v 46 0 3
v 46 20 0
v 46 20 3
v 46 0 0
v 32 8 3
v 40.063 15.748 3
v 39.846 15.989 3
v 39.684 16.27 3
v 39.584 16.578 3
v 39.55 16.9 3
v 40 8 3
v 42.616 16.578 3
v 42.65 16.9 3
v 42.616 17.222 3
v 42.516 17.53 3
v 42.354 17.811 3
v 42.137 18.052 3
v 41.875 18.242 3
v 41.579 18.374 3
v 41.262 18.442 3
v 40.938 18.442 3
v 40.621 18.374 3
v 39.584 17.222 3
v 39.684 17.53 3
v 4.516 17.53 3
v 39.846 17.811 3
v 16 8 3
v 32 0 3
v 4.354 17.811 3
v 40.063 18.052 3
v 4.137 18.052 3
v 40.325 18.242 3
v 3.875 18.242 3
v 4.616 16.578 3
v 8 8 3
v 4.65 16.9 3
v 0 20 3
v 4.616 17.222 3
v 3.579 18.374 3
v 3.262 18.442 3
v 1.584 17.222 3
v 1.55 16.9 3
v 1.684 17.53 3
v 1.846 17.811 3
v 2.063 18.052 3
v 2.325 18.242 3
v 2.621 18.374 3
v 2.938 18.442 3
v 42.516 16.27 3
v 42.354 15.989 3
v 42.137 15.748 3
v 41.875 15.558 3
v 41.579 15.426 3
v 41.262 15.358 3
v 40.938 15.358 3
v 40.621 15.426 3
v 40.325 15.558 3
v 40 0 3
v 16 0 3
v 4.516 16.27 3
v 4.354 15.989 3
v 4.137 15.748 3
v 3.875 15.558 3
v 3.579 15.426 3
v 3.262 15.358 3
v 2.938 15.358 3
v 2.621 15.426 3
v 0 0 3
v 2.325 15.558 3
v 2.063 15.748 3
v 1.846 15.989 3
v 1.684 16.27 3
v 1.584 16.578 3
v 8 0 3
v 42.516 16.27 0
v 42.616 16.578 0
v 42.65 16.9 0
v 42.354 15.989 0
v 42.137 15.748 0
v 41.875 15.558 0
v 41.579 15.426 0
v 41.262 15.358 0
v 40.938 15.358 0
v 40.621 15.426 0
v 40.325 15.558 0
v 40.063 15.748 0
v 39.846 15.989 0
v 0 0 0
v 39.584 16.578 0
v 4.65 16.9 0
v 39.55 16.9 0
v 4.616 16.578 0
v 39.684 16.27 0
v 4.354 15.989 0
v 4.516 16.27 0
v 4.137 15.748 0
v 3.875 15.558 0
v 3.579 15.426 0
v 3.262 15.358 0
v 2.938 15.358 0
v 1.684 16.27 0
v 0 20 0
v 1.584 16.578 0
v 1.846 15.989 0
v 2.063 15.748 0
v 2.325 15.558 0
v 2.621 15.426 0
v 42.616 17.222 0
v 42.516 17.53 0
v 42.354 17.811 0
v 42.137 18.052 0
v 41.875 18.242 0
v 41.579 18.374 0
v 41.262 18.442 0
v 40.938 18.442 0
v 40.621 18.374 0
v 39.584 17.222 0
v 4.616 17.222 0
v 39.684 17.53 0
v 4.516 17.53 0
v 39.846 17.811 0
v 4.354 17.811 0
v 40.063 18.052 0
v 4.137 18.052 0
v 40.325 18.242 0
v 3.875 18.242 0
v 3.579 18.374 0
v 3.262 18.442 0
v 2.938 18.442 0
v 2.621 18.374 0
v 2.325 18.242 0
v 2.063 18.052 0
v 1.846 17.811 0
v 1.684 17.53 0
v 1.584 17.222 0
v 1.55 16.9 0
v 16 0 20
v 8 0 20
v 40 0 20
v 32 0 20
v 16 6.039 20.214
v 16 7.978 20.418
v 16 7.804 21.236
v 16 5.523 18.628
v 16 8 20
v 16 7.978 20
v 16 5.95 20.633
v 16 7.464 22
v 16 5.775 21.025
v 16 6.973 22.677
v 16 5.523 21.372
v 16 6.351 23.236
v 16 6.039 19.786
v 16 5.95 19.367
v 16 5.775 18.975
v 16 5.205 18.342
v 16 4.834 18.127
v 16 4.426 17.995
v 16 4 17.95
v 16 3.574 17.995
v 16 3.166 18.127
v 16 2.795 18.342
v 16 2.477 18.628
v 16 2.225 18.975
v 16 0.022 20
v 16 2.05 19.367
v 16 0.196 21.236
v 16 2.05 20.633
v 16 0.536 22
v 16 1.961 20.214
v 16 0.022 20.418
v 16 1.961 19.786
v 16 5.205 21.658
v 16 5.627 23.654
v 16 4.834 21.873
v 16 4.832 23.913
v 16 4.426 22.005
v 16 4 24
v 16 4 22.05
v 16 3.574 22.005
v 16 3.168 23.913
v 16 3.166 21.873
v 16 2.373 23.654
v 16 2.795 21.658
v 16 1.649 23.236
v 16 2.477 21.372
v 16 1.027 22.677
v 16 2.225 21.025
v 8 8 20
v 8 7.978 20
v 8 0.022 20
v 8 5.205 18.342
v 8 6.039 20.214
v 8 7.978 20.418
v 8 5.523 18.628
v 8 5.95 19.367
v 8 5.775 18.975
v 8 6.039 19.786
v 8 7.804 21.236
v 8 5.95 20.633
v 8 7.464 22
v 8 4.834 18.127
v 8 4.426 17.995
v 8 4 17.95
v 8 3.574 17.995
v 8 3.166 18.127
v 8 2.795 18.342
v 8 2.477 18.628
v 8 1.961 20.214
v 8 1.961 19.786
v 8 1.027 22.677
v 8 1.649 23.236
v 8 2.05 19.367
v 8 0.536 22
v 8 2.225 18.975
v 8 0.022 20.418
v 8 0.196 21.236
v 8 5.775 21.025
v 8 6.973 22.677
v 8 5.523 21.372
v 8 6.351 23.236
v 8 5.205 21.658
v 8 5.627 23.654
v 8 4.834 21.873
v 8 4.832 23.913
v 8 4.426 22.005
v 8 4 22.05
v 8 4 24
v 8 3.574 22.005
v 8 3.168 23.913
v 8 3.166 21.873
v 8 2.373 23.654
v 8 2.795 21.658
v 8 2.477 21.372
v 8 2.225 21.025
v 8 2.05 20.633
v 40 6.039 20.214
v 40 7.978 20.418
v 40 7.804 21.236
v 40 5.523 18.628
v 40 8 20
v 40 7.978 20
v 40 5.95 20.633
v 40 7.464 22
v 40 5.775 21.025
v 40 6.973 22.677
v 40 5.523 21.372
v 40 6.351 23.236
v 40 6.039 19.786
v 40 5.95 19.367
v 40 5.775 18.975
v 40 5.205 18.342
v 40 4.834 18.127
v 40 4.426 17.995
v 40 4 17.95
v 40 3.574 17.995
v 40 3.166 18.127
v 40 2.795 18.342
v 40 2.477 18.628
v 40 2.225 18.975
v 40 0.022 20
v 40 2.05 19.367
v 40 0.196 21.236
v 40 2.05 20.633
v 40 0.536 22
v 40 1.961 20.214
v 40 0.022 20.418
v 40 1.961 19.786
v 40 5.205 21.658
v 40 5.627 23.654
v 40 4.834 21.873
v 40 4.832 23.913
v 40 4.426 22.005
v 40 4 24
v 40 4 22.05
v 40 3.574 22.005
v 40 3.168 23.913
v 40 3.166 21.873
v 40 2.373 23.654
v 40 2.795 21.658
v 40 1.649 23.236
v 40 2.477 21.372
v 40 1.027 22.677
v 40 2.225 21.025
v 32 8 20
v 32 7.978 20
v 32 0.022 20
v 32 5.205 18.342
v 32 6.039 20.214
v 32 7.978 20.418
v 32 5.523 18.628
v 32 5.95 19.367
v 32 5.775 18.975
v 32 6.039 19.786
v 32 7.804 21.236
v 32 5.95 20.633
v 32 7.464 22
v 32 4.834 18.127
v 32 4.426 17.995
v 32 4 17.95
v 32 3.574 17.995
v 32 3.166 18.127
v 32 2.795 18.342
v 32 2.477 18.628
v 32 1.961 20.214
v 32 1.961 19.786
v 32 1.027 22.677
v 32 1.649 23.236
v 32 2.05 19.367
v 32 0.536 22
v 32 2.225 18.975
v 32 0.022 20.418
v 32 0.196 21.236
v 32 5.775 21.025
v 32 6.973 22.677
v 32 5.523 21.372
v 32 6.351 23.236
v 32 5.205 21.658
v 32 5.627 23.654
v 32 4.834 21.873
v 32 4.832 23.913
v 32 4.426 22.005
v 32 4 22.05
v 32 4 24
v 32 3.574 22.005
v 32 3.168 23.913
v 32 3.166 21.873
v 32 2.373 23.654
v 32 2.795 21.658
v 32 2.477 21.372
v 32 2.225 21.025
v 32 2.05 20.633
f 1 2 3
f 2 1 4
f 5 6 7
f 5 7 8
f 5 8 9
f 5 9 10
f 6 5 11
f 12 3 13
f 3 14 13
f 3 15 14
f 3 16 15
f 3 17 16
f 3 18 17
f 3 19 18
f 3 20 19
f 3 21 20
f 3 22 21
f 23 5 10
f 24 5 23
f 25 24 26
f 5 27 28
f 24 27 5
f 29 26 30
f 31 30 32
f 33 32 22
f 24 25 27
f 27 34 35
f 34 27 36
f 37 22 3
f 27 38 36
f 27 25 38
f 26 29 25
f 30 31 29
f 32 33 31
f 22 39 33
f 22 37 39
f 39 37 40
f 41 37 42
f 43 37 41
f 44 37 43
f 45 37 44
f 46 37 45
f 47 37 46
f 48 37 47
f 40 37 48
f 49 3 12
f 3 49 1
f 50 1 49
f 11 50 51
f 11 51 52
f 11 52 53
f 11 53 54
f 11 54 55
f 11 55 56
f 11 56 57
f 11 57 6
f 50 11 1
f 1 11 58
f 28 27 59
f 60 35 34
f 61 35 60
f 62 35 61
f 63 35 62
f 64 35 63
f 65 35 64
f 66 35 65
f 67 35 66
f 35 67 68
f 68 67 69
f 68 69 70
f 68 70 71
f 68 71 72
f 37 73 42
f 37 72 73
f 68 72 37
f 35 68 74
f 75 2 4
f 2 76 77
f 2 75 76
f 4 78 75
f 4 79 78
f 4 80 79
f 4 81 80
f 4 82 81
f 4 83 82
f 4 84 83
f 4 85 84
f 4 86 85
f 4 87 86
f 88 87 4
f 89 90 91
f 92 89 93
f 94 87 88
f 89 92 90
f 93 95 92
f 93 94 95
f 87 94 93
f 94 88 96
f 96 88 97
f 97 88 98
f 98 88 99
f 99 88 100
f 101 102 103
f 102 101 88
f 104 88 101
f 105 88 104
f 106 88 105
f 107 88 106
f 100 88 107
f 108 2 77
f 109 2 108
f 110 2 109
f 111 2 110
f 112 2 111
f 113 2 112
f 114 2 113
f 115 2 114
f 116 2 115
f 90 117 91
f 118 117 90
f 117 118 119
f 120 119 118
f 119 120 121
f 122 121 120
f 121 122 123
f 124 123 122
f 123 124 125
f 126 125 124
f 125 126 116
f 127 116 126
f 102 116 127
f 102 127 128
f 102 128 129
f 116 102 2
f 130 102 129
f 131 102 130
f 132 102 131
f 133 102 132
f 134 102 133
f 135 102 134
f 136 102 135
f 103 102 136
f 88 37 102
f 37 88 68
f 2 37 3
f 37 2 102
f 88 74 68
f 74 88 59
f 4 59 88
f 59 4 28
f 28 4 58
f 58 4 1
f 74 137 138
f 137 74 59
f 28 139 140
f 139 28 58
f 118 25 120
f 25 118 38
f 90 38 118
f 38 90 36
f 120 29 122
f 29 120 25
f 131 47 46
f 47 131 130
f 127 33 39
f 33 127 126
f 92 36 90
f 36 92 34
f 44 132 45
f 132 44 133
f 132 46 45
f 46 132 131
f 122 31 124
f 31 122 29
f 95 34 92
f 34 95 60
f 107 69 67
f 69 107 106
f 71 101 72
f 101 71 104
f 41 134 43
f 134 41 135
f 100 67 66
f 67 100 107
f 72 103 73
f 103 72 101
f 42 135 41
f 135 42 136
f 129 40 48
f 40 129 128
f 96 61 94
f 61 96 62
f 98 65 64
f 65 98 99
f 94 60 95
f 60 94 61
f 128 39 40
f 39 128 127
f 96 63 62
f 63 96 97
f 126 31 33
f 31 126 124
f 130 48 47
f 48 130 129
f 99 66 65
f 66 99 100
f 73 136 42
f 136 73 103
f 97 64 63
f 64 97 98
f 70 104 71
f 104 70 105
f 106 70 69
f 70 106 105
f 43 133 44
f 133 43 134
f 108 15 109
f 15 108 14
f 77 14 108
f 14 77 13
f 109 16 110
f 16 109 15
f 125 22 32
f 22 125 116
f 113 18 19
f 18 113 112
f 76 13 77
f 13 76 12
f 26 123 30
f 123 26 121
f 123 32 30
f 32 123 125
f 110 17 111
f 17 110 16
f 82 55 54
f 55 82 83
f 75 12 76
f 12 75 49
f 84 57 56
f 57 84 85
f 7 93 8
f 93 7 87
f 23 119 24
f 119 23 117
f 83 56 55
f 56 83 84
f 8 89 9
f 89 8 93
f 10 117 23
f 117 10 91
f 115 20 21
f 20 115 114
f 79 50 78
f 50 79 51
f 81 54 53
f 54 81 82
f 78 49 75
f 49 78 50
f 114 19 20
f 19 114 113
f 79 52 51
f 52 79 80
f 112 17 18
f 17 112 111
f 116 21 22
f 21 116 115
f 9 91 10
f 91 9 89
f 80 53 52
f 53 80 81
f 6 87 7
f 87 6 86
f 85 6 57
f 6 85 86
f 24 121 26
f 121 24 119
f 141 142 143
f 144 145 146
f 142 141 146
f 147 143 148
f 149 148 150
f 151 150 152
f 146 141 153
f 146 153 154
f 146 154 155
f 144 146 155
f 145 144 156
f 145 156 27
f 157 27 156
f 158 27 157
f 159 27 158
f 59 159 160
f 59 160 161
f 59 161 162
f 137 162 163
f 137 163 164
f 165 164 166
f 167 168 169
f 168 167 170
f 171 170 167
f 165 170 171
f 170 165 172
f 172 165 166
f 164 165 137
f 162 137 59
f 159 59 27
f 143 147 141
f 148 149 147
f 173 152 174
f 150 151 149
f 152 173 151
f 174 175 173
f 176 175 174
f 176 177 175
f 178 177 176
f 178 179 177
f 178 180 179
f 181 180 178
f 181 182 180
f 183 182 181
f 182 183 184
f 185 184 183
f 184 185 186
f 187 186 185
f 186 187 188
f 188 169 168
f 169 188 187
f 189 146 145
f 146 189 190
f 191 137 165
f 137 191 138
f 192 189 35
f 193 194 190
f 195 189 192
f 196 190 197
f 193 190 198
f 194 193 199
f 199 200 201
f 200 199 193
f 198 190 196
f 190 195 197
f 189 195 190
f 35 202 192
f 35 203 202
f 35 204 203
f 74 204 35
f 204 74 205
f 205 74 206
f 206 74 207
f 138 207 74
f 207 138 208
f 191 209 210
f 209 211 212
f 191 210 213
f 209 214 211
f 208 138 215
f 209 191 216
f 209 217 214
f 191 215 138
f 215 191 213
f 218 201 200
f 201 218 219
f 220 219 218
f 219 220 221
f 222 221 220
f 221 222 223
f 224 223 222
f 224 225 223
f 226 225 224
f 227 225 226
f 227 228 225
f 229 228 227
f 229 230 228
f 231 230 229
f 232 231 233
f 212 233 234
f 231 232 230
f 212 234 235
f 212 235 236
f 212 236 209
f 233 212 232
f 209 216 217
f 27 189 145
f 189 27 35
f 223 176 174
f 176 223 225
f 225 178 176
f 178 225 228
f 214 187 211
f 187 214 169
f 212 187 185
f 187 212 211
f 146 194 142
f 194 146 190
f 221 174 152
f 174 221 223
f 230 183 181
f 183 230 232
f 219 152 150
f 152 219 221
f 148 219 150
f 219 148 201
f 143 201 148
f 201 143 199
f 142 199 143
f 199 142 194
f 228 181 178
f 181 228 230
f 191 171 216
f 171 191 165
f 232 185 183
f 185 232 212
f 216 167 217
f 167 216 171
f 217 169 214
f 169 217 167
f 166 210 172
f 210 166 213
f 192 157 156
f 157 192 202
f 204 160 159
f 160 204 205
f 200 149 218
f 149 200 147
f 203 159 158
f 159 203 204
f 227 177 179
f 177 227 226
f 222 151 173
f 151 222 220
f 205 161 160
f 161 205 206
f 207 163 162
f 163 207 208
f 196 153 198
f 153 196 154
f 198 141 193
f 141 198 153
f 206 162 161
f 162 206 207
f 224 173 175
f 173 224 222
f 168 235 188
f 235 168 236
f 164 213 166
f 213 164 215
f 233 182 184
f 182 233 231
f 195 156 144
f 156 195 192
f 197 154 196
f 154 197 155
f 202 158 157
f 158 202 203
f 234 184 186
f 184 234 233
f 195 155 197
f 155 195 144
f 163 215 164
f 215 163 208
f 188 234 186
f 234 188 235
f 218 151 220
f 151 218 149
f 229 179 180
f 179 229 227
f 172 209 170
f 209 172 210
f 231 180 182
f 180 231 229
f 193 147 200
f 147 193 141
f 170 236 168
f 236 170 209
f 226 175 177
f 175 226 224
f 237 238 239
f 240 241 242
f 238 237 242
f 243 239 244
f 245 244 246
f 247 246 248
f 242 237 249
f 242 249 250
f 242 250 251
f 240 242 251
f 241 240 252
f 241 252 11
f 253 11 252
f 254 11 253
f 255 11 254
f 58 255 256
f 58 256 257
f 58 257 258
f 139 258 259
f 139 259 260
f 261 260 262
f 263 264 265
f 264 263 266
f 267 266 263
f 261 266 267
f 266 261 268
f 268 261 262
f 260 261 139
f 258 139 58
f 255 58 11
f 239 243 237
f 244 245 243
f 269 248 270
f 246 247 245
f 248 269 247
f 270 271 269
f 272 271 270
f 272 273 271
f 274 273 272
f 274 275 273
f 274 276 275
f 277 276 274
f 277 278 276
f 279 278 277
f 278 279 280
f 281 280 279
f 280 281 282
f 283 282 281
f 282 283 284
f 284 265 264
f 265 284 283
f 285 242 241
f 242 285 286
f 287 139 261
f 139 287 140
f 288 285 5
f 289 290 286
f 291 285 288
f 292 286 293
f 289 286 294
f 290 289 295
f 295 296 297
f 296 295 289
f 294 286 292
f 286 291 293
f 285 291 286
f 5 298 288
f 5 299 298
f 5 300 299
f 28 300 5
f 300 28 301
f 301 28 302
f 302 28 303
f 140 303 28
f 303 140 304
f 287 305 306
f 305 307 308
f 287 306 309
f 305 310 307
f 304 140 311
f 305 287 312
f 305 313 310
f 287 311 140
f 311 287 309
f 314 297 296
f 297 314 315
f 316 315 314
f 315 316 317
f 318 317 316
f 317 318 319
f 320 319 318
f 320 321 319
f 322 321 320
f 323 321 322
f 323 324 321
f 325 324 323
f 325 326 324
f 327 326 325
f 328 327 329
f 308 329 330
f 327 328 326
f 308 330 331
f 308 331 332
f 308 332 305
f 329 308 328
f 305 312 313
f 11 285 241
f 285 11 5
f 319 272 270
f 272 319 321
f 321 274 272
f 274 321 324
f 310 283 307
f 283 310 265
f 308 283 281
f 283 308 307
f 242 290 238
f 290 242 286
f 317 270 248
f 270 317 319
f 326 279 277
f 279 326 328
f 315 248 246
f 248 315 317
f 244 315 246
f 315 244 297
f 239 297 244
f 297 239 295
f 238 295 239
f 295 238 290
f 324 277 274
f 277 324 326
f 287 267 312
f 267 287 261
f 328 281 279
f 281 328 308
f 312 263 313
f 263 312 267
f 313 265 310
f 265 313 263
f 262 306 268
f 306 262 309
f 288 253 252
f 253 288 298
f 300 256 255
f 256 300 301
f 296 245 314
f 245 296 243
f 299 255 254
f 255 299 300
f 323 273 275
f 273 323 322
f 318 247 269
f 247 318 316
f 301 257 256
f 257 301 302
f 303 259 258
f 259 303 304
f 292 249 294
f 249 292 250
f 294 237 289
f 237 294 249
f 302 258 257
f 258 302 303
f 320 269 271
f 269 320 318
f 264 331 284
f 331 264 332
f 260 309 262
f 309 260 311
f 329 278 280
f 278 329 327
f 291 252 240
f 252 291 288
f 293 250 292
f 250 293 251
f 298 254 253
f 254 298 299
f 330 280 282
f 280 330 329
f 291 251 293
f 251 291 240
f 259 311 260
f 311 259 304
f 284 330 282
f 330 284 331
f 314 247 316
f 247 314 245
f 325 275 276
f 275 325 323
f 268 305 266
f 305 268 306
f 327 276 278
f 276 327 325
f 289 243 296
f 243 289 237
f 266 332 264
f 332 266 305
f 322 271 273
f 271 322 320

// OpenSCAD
// Cooling Fan Bracket
$fs = 0.2;		// Circle edges 


bearing_id = 8.0;
bearing_od = 22.0;
bearing_w = 7.0;

fan_length = 46;
fan_width = 20;

wall_thickness = 3;
pillar_width=8.0;
pillar_height=20.0;

fan_dist = 38.0 ;
bracket_dist = 16.0;


widget_offset = 10; // amount of x-travel to side of y-tray
bearing_offset = -0.5; // amount of bearing height from tray

m4_bolt = 2.05;
m3_bolt = 1.55;



difference()
	{
	cube(size=[fan_length, fan_width, wall_thickness] );
	
	translate(v=[m3_bolt * 2, fan_width - m3_bolt * 2, 0 ] )
		cylinder(r=m3_bolt, h=wall_thickness );
	translate(v=[m3_bolt * 2 + fan_dist, fan_width - m3_bolt * 2, 0 ] )
		cylinder(r=m3_bolt, h=wall_thickness );
	}



translate(v=[pillar_width , 0,0 ] )
	bracket();

translate(v=[pillar_width * 2 + bracket_dist, 0,0 ] )
	bracket();




module bracket()
	{
	difference()
		{
		union()
			{
			cube( size=[pillar_width, pillar_width, pillar_height] );
	
			translate(v=[0, pillar_width/2, pillar_height] )
				rotate( a=[0,90,0] )
					cylinder(r=pillar_width/2, h=pillar_width);
			}
			translate(v=[0, pillar_width/2, pillar_height] )
				rotate( a=[0,90,0] )
					cylinder(r=m4_bolt, h=pillar_width);
		}
}
